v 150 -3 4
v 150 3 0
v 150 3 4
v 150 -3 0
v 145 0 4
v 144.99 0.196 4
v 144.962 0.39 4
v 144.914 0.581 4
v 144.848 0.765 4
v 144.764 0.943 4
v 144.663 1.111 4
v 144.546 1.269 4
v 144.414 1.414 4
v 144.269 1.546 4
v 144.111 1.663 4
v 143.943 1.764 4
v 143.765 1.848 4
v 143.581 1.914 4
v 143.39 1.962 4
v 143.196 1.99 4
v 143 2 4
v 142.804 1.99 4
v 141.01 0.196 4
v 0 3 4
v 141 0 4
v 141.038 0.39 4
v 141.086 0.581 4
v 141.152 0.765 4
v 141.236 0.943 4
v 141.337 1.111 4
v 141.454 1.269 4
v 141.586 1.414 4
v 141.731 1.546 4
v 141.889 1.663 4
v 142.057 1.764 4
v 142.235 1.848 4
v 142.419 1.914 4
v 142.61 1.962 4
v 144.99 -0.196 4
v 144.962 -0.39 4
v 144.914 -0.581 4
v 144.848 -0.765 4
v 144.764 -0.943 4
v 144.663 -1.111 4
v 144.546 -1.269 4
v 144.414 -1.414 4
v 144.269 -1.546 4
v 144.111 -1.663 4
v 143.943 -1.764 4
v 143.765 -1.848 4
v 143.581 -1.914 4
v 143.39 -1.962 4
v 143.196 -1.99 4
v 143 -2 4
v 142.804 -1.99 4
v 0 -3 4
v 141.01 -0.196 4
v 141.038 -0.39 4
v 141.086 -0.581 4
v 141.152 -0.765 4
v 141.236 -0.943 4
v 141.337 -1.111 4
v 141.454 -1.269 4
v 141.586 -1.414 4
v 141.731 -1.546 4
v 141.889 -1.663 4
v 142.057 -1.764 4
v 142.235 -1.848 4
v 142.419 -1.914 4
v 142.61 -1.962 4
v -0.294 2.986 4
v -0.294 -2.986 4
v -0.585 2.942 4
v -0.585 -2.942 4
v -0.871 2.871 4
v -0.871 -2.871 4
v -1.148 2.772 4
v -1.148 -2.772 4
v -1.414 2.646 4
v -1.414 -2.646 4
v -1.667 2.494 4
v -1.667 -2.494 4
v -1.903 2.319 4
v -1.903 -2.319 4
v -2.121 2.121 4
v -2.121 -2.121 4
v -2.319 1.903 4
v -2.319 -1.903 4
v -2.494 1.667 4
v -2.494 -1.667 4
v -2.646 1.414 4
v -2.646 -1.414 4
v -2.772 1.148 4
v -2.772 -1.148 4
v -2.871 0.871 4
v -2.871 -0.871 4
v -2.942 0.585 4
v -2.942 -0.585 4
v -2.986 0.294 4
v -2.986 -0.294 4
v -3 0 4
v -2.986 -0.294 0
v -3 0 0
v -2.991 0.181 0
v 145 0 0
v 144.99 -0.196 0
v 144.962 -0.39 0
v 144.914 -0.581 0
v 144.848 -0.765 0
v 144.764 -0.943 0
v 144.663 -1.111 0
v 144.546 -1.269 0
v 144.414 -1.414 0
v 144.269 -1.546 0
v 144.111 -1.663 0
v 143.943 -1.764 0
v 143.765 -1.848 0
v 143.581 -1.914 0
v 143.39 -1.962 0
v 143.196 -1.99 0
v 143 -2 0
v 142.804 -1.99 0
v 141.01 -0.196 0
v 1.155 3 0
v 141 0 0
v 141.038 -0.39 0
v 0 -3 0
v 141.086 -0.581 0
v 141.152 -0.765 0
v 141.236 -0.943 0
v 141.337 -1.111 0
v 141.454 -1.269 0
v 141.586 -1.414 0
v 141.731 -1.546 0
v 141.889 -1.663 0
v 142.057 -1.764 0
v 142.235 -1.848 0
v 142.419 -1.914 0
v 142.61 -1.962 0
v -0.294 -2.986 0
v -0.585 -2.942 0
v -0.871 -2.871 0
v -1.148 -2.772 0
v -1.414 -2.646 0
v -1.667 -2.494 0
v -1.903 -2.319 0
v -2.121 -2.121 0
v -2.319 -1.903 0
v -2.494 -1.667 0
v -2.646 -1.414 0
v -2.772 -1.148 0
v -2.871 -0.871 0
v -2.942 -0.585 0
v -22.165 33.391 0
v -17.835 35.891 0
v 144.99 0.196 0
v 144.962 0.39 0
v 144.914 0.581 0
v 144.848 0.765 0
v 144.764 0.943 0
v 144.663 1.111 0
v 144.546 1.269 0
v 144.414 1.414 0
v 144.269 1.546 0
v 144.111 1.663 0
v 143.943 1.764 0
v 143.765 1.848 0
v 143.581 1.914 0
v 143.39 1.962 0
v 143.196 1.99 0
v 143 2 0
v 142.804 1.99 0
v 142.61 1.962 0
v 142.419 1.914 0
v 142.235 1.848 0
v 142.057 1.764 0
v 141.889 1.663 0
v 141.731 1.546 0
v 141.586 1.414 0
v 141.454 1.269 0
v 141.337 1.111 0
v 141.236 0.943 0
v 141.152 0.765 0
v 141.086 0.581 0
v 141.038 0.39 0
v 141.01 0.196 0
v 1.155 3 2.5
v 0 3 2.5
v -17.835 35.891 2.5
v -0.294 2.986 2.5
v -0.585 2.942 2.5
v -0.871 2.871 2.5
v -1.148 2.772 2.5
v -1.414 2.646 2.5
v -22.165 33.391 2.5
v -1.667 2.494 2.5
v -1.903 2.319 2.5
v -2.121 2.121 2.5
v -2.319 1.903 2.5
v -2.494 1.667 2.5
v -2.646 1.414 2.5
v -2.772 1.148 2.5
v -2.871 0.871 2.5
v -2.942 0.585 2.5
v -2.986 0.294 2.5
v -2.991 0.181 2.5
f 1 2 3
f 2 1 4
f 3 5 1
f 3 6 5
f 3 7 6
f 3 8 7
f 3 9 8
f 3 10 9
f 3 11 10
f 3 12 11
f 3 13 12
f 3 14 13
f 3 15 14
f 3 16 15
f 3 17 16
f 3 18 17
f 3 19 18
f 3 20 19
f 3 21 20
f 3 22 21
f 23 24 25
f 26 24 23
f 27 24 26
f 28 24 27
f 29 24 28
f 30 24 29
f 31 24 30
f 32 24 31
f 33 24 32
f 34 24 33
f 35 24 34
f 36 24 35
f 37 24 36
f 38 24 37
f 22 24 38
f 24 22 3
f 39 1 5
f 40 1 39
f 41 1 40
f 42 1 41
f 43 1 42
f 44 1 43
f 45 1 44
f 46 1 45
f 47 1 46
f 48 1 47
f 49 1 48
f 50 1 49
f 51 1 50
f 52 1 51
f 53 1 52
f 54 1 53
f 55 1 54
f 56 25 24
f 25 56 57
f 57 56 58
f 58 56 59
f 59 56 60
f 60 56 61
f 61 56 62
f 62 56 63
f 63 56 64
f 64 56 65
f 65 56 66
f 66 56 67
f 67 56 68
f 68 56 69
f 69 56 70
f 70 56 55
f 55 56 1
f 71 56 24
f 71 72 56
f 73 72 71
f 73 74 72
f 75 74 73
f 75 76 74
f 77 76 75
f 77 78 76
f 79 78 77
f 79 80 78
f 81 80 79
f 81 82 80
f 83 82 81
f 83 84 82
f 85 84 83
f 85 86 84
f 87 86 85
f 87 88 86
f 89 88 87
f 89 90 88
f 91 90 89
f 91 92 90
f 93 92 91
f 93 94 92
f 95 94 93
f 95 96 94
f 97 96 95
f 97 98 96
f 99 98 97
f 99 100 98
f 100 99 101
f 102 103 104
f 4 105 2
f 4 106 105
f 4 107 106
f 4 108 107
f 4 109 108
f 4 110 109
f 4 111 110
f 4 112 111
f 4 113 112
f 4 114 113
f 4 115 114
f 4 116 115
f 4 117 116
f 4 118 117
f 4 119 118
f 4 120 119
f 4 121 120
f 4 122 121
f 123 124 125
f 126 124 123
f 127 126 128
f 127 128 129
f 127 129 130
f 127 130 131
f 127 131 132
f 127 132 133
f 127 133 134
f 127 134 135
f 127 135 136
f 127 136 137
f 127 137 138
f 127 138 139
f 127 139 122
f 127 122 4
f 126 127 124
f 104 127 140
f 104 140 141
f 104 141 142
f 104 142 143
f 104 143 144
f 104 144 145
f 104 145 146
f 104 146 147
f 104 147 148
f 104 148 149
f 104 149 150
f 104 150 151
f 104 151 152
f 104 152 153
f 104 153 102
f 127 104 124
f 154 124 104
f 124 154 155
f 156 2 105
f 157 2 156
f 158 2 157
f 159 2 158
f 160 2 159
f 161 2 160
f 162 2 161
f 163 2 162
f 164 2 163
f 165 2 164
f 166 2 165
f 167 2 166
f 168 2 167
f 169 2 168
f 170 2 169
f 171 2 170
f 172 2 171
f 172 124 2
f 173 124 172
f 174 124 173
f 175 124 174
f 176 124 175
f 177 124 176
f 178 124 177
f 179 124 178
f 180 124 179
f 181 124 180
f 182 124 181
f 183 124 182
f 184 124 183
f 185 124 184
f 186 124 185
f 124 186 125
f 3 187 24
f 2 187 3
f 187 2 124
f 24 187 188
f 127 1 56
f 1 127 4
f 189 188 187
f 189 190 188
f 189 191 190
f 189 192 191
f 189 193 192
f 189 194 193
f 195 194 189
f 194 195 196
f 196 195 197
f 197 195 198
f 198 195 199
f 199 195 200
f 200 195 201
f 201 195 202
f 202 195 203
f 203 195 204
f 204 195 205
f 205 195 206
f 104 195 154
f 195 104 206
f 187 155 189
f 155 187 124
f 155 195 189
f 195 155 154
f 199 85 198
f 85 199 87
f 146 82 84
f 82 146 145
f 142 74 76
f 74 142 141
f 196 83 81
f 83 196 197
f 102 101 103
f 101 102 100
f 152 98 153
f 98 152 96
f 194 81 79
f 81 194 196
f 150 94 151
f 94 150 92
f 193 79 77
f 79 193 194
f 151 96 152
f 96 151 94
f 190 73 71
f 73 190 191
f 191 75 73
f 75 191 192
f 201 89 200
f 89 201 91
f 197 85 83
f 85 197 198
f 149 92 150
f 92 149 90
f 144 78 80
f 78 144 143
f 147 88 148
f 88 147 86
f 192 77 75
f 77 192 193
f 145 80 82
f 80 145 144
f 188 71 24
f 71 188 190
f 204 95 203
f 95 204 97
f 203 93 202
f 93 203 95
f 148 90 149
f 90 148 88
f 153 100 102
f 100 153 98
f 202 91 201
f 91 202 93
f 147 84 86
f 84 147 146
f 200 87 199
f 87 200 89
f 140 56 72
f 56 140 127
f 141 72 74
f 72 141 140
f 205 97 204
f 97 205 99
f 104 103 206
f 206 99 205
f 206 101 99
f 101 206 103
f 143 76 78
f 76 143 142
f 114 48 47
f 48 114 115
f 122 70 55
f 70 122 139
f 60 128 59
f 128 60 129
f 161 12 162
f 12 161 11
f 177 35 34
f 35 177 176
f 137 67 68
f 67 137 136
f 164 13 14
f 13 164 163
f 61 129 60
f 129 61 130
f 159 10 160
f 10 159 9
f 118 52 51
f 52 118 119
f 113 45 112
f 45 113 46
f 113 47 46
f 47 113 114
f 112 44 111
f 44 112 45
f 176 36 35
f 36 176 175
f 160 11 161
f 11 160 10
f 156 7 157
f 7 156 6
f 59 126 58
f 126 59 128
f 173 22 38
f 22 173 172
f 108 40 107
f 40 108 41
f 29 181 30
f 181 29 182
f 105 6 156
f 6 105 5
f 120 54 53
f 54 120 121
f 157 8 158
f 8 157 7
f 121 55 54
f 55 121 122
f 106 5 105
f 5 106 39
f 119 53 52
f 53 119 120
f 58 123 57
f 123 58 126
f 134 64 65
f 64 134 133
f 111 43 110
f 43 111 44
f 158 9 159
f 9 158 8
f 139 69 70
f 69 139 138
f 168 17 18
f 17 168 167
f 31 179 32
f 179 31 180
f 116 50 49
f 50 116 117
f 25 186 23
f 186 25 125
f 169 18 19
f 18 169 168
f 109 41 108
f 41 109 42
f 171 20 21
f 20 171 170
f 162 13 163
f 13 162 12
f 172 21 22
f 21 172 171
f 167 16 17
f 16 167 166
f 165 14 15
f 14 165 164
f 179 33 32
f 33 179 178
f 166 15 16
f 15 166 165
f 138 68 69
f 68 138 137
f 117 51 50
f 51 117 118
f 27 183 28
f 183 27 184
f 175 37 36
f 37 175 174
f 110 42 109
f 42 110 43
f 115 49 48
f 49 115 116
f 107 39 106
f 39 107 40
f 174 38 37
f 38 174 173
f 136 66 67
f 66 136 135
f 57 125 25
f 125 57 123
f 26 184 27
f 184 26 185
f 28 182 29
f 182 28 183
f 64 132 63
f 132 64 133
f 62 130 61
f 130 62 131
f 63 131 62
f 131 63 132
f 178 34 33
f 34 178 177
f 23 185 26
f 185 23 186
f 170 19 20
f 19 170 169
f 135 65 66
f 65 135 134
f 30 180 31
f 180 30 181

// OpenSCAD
// L-shaped (hockey-stick) cell spreader, printed flat on the XY plane.
// All dimensions in millimetres.

$fn = 64;

// Handle (long bar, +X direction)
handle_len   = 150;   // length along +X
handle_w     = 6;     // width in Y
handle_t     = 4;     // thickness in Z (0..4)

// Spreading foot (thin bar, 120 deg CCW from +X)
foot_len     = 40;    // length along its axis
foot_w       = 5;     // width in Y (local)
foot_t       = 2.5;   // thickness in Z (0..2.5)
foot_angle   = 120;   // degrees CCW from +X, seen from above

// Round boss at the origin joining the bars
boss_d       = 6;     // diameter
boss_t       = 4;     // height (0..4)

// Hanging hole through the handle
hole_d       = 4;     // diameter
hole_x       = 143;   // centre X position on the handle

// ---- Handle: x = 0..150, y = -3..3, z = 0..4 ----
module handle() { translate([0, -handle_w/2, 0])
    cube([handle_len, handle_w, handle_t]); }

// ---- Spreading foot: 40 mm bar rotated 120 deg about Z, z = 0..2.5 ----
// Centre line starts at origin and points 120 deg CCW from +X.
// Foot extends from origin along that direction for 40 mm.
module foot() { rotate([0, 0, foot_angle])
    translate([0, -foot_w/2, 0])
    cube([foot_len, foot_w, foot_t]); }

// ---- Round boss at the origin (centred on origin) ----
module boss() { cylinder(h = boss_t, d = boss_d, $fn = $fn); }

// ---- Hanging hole: 4 mm through the handle at x = 143, y = 0 ----
// Cut cylinder extends 1 mm past each face of the 4 mm-thick handle.
module hole() { translate([hole_x, 0, -1])
    cylinder(h = handle_t + 2, d = hole_d, $fn = $fn); }

// ---- Assemble: union of the three solids, then subtract the hole ----
difference() {
    union() {
        handle();
        foot();
        boss();
    }
    hole();
}
